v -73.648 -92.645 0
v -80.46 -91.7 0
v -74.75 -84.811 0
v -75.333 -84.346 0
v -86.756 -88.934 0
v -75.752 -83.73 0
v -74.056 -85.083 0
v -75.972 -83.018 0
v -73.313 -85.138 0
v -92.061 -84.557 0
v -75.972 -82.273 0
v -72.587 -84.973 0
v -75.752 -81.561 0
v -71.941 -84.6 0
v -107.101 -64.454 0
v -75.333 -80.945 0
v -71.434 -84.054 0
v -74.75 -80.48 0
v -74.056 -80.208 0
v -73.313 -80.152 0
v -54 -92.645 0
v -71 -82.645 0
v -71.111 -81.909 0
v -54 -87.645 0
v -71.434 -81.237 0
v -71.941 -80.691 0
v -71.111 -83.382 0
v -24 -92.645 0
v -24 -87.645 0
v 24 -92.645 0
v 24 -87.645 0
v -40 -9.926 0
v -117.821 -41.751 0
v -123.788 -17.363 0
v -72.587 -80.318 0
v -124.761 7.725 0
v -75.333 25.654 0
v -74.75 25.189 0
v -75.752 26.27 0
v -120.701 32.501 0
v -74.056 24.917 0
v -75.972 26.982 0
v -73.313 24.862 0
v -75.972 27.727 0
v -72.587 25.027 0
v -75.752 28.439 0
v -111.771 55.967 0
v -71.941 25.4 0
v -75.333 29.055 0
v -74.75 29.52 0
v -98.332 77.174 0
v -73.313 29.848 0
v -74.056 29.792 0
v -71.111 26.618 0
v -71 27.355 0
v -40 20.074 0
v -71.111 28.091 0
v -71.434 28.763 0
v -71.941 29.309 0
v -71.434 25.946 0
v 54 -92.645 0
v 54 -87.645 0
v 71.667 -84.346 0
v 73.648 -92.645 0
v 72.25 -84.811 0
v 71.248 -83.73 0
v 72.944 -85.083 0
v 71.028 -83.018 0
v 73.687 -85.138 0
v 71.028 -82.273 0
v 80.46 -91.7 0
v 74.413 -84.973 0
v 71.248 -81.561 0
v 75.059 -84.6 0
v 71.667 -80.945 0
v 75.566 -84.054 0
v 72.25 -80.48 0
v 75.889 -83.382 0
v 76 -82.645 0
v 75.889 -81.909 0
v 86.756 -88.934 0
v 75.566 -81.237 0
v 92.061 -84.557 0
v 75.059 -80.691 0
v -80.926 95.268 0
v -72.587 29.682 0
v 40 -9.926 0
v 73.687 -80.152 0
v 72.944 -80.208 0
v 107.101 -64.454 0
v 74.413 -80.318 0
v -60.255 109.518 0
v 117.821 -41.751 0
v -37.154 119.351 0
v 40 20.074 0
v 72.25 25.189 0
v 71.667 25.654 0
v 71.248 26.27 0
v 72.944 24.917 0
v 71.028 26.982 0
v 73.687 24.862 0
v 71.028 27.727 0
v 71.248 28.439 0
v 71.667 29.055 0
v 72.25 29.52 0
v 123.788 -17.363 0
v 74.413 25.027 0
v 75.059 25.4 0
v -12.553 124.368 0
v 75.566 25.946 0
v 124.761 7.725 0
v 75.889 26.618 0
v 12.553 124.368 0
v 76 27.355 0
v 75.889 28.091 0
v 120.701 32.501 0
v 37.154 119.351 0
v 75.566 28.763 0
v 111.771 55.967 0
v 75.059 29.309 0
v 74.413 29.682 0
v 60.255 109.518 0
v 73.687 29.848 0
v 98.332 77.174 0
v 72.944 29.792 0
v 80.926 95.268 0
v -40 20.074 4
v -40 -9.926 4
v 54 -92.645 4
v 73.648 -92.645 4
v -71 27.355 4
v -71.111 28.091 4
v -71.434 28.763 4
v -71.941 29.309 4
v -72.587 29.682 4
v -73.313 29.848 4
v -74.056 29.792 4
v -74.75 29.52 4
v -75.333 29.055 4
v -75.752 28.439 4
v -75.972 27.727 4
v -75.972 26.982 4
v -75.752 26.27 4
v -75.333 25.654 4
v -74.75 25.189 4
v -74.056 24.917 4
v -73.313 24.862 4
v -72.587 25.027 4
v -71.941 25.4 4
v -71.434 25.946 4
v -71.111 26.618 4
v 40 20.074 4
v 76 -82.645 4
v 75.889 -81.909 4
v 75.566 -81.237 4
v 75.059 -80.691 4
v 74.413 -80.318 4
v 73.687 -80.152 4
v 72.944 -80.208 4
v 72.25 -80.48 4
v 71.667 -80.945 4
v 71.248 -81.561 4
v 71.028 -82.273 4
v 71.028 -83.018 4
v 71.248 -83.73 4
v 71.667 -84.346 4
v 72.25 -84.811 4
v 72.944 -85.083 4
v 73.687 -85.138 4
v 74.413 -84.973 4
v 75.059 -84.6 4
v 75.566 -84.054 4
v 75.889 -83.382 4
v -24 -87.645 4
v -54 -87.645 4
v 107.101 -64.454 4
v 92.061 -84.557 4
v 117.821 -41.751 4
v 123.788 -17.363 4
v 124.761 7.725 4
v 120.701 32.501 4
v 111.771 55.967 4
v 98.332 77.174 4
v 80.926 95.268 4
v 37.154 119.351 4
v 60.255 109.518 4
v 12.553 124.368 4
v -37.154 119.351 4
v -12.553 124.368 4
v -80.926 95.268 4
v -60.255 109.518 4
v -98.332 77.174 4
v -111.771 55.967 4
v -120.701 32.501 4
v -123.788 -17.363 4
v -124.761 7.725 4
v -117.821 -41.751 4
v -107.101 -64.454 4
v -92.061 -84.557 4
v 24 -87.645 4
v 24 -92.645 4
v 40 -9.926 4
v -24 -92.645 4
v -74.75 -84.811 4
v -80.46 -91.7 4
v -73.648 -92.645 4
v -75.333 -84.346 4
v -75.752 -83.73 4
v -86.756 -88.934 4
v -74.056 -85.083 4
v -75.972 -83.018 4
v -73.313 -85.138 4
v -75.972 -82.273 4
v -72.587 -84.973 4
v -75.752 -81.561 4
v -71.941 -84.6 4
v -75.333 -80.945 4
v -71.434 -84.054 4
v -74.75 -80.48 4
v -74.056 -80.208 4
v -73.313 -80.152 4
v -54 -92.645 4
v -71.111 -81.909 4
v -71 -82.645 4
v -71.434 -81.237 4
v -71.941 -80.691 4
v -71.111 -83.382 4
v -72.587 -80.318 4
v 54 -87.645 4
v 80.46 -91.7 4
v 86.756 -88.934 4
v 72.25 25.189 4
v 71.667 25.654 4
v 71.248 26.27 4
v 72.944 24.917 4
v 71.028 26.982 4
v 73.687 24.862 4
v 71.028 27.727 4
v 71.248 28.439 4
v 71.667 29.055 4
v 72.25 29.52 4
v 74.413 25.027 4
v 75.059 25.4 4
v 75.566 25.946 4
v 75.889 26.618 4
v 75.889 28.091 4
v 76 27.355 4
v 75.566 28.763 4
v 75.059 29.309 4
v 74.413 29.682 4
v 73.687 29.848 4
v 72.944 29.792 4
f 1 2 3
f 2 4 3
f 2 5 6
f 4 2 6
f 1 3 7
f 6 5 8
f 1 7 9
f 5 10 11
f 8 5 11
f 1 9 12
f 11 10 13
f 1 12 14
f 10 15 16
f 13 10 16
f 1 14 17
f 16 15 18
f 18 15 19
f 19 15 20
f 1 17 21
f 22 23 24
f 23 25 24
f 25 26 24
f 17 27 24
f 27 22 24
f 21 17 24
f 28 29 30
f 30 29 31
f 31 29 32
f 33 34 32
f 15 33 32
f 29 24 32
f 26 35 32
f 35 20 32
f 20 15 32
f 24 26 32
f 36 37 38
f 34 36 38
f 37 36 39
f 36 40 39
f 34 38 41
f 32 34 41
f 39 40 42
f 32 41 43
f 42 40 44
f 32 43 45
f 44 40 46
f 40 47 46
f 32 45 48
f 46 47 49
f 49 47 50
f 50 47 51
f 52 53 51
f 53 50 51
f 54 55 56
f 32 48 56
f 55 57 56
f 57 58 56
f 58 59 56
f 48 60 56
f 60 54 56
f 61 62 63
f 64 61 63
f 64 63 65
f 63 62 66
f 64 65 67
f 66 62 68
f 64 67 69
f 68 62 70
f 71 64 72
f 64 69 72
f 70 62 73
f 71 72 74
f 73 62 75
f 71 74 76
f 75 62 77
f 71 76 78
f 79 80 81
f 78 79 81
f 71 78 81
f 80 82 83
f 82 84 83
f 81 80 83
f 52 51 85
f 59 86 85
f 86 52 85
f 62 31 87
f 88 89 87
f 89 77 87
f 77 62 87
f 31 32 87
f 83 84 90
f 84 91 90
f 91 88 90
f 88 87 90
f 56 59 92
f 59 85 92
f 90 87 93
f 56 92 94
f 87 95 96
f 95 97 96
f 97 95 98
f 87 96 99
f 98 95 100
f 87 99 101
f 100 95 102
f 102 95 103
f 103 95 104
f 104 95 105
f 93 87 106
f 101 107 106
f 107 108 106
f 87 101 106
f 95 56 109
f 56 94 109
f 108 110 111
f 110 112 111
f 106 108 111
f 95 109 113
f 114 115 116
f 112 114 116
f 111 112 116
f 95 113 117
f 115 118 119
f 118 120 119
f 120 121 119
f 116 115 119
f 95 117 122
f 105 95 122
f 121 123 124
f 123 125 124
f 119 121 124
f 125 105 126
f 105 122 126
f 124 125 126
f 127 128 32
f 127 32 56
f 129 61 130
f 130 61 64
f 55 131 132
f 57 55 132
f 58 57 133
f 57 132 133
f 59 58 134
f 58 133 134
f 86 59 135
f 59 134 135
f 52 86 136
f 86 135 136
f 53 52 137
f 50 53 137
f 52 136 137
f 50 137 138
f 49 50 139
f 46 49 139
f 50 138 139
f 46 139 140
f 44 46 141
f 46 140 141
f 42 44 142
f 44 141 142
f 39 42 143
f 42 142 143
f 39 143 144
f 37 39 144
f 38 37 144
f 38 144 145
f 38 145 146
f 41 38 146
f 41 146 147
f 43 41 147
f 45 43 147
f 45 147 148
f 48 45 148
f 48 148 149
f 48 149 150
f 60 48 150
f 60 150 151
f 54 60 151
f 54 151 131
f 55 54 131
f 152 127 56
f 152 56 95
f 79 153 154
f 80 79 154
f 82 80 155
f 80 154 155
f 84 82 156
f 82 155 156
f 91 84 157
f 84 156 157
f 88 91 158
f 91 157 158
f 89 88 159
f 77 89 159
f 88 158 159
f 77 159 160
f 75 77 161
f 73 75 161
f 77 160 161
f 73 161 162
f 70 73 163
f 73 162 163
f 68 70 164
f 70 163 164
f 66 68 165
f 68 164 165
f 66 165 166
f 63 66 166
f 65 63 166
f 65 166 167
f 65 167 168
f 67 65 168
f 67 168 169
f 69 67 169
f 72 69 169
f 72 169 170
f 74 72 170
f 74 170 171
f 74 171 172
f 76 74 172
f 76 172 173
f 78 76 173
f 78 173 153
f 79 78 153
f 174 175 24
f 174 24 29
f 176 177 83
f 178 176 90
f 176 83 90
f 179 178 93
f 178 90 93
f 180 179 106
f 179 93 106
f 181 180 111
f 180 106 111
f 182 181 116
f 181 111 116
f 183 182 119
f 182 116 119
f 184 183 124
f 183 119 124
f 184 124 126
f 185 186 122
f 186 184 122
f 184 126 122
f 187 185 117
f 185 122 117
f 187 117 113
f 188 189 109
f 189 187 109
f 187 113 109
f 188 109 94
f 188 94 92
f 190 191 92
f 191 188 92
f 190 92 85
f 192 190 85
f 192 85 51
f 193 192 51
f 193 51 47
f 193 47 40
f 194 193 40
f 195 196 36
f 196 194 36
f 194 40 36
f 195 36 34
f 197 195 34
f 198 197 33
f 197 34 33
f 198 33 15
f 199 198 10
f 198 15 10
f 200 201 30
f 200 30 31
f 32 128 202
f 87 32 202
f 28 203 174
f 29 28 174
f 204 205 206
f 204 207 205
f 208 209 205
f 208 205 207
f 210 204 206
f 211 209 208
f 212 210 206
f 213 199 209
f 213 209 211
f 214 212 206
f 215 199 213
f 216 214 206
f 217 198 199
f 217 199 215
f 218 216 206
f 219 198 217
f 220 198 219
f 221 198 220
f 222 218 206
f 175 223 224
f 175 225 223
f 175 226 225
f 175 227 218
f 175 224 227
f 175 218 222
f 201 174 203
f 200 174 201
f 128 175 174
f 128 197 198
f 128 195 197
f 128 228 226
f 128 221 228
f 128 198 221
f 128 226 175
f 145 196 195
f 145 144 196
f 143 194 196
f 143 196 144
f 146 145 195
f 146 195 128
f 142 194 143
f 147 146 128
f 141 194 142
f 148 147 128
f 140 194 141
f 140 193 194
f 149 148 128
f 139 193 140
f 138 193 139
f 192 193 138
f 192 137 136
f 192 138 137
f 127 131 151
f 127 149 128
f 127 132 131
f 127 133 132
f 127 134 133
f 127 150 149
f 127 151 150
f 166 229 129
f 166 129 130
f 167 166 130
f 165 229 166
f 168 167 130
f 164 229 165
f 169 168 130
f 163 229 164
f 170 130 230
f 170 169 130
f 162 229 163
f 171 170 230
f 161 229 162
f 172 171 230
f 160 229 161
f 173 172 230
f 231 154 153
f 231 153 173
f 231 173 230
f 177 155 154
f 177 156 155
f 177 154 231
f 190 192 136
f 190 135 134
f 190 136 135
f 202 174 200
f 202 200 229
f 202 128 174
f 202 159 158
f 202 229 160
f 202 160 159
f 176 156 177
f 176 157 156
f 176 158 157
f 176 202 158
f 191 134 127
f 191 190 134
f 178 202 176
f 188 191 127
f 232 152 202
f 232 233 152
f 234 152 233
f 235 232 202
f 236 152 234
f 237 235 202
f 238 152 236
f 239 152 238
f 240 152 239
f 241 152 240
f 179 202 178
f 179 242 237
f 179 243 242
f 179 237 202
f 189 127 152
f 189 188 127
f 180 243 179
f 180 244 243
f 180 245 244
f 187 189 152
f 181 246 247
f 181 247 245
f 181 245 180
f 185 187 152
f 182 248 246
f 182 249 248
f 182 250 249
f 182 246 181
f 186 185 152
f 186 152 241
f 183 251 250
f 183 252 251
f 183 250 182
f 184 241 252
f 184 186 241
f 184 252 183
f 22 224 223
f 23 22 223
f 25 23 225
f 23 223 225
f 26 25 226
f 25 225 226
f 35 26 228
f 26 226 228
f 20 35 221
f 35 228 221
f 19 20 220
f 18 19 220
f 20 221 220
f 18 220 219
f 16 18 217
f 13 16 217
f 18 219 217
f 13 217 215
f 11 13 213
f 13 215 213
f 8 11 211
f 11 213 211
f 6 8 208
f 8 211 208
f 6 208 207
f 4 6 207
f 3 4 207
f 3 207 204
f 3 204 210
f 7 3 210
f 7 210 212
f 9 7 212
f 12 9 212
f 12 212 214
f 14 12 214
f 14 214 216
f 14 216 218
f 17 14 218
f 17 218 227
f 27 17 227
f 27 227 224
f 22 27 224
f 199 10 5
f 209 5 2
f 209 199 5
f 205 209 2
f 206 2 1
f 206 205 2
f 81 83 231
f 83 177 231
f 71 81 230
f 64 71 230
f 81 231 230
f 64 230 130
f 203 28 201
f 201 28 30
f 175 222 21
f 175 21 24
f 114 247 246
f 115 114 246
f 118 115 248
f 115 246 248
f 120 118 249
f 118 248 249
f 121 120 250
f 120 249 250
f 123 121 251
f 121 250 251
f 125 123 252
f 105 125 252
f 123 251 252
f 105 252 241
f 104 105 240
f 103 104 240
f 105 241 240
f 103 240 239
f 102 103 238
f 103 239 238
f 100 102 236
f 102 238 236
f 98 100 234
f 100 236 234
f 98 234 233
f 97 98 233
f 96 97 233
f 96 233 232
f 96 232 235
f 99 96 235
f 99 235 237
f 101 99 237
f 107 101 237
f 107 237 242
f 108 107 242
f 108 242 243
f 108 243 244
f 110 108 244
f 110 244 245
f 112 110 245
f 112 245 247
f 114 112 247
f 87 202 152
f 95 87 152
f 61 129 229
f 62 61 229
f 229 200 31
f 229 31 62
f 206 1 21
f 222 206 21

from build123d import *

# Parameters (mm, degrees)
SKETCH1_R           = 125
BOSS_EXTRUDE1_DEPTH = 4
CUT_EXTRUDE2_START  = -10
CUT_EXTRUDE2_DEPTH  = 10
FILLET1_R           = 25
SKETCH6_W           = 30
SKETCH6_H           = 5
CUT_EXTRUDE5_DEPTH  = 5
SKETCH7_R           = 2.5
CUT_EXTRUDE6_DEPTH  = 177.821944339
SKETCH8_W           = 80
SKETCH8_H           = 30
CUT_EXTRUDE7_DEPTH  = 177.821944339


with BuildPart() as part:
    # Sketch1 → Boss-Extrude1 (new body)
    with BuildSketch(Plane.XY):
        Circle(SKETCH1_R)
    extrude(amount=BOSS_EXTRUDE1_DEPTH)

    # Sketch3 → Cut-Extrude2 (cut)
    with BuildSketch(Plane.XY.offset(4).offset(CUT_EXTRUDE2_START)):
        with BuildLine():
            Line((-83.915537646, -92.645466924), (83.915537646, -92.645466924))
            ThreePointArc((83.915537646, -92.645466924), (0, -125), (-83.915537646, -92.645466924))
        make_face()
    extrude(amount=CUT_EXTRUDE2_DEPTH, mode=Mode.SUBTRACT)

    # Fillet1
    fillet1_edges = [part.edges().sort_by_distance(p)[0] for p in [
        (83.915537646, -92.645466924, 2),
        (-83.915537646, -92.645466924, 2),
    ]]
    fillet(fillet1_edges, radius=FILLET1_R)

    # Sketch6 → Cut-Extrude5 (cut)
    with BuildSketch(Plane.XY.offset(4)):
        with Locations((39, -90.145466924)):
            Rectangle(SKETCH6_W, SKETCH6_H)
        with Locations((-39, -90.145466924)):
            Rectangle(SKETCH6_W, SKETCH6_H)
    extrude(amount=-CUT_EXTRUDE5_DEPTH, mode=Mode.SUBTRACT)

    # Sketch7 → Cut-Extrude6 (cut, through all)
    with BuildSketch(Plane.XY.offset(4)):
        with Locations((73.5, -82.645466924)):
            Circle(SKETCH7_R)
        with Locations((73.5, 27.354533076)):
            Circle(SKETCH7_R)
        with Locations((-73.5, 27.354533076)):
            Circle(SKETCH7_R)
        with Locations((-73.5, -82.645466924)):
            Circle(SKETCH7_R)
    extrude(amount=-CUT_EXTRUDE6_DEPTH, mode=Mode.SUBTRACT)

    # Sketch8 → Cut-Extrude7 (cut, through all)
    with BuildSketch(Plane.XY.offset(4)):
        with Locations((0, 5.074477417)):
            Rectangle(SKETCH8_W, SKETCH8_H)
    extrude(amount=-CUT_EXTRUDE7_DEPTH, mode=Mode.SUBTRACT)


solid = part.part
